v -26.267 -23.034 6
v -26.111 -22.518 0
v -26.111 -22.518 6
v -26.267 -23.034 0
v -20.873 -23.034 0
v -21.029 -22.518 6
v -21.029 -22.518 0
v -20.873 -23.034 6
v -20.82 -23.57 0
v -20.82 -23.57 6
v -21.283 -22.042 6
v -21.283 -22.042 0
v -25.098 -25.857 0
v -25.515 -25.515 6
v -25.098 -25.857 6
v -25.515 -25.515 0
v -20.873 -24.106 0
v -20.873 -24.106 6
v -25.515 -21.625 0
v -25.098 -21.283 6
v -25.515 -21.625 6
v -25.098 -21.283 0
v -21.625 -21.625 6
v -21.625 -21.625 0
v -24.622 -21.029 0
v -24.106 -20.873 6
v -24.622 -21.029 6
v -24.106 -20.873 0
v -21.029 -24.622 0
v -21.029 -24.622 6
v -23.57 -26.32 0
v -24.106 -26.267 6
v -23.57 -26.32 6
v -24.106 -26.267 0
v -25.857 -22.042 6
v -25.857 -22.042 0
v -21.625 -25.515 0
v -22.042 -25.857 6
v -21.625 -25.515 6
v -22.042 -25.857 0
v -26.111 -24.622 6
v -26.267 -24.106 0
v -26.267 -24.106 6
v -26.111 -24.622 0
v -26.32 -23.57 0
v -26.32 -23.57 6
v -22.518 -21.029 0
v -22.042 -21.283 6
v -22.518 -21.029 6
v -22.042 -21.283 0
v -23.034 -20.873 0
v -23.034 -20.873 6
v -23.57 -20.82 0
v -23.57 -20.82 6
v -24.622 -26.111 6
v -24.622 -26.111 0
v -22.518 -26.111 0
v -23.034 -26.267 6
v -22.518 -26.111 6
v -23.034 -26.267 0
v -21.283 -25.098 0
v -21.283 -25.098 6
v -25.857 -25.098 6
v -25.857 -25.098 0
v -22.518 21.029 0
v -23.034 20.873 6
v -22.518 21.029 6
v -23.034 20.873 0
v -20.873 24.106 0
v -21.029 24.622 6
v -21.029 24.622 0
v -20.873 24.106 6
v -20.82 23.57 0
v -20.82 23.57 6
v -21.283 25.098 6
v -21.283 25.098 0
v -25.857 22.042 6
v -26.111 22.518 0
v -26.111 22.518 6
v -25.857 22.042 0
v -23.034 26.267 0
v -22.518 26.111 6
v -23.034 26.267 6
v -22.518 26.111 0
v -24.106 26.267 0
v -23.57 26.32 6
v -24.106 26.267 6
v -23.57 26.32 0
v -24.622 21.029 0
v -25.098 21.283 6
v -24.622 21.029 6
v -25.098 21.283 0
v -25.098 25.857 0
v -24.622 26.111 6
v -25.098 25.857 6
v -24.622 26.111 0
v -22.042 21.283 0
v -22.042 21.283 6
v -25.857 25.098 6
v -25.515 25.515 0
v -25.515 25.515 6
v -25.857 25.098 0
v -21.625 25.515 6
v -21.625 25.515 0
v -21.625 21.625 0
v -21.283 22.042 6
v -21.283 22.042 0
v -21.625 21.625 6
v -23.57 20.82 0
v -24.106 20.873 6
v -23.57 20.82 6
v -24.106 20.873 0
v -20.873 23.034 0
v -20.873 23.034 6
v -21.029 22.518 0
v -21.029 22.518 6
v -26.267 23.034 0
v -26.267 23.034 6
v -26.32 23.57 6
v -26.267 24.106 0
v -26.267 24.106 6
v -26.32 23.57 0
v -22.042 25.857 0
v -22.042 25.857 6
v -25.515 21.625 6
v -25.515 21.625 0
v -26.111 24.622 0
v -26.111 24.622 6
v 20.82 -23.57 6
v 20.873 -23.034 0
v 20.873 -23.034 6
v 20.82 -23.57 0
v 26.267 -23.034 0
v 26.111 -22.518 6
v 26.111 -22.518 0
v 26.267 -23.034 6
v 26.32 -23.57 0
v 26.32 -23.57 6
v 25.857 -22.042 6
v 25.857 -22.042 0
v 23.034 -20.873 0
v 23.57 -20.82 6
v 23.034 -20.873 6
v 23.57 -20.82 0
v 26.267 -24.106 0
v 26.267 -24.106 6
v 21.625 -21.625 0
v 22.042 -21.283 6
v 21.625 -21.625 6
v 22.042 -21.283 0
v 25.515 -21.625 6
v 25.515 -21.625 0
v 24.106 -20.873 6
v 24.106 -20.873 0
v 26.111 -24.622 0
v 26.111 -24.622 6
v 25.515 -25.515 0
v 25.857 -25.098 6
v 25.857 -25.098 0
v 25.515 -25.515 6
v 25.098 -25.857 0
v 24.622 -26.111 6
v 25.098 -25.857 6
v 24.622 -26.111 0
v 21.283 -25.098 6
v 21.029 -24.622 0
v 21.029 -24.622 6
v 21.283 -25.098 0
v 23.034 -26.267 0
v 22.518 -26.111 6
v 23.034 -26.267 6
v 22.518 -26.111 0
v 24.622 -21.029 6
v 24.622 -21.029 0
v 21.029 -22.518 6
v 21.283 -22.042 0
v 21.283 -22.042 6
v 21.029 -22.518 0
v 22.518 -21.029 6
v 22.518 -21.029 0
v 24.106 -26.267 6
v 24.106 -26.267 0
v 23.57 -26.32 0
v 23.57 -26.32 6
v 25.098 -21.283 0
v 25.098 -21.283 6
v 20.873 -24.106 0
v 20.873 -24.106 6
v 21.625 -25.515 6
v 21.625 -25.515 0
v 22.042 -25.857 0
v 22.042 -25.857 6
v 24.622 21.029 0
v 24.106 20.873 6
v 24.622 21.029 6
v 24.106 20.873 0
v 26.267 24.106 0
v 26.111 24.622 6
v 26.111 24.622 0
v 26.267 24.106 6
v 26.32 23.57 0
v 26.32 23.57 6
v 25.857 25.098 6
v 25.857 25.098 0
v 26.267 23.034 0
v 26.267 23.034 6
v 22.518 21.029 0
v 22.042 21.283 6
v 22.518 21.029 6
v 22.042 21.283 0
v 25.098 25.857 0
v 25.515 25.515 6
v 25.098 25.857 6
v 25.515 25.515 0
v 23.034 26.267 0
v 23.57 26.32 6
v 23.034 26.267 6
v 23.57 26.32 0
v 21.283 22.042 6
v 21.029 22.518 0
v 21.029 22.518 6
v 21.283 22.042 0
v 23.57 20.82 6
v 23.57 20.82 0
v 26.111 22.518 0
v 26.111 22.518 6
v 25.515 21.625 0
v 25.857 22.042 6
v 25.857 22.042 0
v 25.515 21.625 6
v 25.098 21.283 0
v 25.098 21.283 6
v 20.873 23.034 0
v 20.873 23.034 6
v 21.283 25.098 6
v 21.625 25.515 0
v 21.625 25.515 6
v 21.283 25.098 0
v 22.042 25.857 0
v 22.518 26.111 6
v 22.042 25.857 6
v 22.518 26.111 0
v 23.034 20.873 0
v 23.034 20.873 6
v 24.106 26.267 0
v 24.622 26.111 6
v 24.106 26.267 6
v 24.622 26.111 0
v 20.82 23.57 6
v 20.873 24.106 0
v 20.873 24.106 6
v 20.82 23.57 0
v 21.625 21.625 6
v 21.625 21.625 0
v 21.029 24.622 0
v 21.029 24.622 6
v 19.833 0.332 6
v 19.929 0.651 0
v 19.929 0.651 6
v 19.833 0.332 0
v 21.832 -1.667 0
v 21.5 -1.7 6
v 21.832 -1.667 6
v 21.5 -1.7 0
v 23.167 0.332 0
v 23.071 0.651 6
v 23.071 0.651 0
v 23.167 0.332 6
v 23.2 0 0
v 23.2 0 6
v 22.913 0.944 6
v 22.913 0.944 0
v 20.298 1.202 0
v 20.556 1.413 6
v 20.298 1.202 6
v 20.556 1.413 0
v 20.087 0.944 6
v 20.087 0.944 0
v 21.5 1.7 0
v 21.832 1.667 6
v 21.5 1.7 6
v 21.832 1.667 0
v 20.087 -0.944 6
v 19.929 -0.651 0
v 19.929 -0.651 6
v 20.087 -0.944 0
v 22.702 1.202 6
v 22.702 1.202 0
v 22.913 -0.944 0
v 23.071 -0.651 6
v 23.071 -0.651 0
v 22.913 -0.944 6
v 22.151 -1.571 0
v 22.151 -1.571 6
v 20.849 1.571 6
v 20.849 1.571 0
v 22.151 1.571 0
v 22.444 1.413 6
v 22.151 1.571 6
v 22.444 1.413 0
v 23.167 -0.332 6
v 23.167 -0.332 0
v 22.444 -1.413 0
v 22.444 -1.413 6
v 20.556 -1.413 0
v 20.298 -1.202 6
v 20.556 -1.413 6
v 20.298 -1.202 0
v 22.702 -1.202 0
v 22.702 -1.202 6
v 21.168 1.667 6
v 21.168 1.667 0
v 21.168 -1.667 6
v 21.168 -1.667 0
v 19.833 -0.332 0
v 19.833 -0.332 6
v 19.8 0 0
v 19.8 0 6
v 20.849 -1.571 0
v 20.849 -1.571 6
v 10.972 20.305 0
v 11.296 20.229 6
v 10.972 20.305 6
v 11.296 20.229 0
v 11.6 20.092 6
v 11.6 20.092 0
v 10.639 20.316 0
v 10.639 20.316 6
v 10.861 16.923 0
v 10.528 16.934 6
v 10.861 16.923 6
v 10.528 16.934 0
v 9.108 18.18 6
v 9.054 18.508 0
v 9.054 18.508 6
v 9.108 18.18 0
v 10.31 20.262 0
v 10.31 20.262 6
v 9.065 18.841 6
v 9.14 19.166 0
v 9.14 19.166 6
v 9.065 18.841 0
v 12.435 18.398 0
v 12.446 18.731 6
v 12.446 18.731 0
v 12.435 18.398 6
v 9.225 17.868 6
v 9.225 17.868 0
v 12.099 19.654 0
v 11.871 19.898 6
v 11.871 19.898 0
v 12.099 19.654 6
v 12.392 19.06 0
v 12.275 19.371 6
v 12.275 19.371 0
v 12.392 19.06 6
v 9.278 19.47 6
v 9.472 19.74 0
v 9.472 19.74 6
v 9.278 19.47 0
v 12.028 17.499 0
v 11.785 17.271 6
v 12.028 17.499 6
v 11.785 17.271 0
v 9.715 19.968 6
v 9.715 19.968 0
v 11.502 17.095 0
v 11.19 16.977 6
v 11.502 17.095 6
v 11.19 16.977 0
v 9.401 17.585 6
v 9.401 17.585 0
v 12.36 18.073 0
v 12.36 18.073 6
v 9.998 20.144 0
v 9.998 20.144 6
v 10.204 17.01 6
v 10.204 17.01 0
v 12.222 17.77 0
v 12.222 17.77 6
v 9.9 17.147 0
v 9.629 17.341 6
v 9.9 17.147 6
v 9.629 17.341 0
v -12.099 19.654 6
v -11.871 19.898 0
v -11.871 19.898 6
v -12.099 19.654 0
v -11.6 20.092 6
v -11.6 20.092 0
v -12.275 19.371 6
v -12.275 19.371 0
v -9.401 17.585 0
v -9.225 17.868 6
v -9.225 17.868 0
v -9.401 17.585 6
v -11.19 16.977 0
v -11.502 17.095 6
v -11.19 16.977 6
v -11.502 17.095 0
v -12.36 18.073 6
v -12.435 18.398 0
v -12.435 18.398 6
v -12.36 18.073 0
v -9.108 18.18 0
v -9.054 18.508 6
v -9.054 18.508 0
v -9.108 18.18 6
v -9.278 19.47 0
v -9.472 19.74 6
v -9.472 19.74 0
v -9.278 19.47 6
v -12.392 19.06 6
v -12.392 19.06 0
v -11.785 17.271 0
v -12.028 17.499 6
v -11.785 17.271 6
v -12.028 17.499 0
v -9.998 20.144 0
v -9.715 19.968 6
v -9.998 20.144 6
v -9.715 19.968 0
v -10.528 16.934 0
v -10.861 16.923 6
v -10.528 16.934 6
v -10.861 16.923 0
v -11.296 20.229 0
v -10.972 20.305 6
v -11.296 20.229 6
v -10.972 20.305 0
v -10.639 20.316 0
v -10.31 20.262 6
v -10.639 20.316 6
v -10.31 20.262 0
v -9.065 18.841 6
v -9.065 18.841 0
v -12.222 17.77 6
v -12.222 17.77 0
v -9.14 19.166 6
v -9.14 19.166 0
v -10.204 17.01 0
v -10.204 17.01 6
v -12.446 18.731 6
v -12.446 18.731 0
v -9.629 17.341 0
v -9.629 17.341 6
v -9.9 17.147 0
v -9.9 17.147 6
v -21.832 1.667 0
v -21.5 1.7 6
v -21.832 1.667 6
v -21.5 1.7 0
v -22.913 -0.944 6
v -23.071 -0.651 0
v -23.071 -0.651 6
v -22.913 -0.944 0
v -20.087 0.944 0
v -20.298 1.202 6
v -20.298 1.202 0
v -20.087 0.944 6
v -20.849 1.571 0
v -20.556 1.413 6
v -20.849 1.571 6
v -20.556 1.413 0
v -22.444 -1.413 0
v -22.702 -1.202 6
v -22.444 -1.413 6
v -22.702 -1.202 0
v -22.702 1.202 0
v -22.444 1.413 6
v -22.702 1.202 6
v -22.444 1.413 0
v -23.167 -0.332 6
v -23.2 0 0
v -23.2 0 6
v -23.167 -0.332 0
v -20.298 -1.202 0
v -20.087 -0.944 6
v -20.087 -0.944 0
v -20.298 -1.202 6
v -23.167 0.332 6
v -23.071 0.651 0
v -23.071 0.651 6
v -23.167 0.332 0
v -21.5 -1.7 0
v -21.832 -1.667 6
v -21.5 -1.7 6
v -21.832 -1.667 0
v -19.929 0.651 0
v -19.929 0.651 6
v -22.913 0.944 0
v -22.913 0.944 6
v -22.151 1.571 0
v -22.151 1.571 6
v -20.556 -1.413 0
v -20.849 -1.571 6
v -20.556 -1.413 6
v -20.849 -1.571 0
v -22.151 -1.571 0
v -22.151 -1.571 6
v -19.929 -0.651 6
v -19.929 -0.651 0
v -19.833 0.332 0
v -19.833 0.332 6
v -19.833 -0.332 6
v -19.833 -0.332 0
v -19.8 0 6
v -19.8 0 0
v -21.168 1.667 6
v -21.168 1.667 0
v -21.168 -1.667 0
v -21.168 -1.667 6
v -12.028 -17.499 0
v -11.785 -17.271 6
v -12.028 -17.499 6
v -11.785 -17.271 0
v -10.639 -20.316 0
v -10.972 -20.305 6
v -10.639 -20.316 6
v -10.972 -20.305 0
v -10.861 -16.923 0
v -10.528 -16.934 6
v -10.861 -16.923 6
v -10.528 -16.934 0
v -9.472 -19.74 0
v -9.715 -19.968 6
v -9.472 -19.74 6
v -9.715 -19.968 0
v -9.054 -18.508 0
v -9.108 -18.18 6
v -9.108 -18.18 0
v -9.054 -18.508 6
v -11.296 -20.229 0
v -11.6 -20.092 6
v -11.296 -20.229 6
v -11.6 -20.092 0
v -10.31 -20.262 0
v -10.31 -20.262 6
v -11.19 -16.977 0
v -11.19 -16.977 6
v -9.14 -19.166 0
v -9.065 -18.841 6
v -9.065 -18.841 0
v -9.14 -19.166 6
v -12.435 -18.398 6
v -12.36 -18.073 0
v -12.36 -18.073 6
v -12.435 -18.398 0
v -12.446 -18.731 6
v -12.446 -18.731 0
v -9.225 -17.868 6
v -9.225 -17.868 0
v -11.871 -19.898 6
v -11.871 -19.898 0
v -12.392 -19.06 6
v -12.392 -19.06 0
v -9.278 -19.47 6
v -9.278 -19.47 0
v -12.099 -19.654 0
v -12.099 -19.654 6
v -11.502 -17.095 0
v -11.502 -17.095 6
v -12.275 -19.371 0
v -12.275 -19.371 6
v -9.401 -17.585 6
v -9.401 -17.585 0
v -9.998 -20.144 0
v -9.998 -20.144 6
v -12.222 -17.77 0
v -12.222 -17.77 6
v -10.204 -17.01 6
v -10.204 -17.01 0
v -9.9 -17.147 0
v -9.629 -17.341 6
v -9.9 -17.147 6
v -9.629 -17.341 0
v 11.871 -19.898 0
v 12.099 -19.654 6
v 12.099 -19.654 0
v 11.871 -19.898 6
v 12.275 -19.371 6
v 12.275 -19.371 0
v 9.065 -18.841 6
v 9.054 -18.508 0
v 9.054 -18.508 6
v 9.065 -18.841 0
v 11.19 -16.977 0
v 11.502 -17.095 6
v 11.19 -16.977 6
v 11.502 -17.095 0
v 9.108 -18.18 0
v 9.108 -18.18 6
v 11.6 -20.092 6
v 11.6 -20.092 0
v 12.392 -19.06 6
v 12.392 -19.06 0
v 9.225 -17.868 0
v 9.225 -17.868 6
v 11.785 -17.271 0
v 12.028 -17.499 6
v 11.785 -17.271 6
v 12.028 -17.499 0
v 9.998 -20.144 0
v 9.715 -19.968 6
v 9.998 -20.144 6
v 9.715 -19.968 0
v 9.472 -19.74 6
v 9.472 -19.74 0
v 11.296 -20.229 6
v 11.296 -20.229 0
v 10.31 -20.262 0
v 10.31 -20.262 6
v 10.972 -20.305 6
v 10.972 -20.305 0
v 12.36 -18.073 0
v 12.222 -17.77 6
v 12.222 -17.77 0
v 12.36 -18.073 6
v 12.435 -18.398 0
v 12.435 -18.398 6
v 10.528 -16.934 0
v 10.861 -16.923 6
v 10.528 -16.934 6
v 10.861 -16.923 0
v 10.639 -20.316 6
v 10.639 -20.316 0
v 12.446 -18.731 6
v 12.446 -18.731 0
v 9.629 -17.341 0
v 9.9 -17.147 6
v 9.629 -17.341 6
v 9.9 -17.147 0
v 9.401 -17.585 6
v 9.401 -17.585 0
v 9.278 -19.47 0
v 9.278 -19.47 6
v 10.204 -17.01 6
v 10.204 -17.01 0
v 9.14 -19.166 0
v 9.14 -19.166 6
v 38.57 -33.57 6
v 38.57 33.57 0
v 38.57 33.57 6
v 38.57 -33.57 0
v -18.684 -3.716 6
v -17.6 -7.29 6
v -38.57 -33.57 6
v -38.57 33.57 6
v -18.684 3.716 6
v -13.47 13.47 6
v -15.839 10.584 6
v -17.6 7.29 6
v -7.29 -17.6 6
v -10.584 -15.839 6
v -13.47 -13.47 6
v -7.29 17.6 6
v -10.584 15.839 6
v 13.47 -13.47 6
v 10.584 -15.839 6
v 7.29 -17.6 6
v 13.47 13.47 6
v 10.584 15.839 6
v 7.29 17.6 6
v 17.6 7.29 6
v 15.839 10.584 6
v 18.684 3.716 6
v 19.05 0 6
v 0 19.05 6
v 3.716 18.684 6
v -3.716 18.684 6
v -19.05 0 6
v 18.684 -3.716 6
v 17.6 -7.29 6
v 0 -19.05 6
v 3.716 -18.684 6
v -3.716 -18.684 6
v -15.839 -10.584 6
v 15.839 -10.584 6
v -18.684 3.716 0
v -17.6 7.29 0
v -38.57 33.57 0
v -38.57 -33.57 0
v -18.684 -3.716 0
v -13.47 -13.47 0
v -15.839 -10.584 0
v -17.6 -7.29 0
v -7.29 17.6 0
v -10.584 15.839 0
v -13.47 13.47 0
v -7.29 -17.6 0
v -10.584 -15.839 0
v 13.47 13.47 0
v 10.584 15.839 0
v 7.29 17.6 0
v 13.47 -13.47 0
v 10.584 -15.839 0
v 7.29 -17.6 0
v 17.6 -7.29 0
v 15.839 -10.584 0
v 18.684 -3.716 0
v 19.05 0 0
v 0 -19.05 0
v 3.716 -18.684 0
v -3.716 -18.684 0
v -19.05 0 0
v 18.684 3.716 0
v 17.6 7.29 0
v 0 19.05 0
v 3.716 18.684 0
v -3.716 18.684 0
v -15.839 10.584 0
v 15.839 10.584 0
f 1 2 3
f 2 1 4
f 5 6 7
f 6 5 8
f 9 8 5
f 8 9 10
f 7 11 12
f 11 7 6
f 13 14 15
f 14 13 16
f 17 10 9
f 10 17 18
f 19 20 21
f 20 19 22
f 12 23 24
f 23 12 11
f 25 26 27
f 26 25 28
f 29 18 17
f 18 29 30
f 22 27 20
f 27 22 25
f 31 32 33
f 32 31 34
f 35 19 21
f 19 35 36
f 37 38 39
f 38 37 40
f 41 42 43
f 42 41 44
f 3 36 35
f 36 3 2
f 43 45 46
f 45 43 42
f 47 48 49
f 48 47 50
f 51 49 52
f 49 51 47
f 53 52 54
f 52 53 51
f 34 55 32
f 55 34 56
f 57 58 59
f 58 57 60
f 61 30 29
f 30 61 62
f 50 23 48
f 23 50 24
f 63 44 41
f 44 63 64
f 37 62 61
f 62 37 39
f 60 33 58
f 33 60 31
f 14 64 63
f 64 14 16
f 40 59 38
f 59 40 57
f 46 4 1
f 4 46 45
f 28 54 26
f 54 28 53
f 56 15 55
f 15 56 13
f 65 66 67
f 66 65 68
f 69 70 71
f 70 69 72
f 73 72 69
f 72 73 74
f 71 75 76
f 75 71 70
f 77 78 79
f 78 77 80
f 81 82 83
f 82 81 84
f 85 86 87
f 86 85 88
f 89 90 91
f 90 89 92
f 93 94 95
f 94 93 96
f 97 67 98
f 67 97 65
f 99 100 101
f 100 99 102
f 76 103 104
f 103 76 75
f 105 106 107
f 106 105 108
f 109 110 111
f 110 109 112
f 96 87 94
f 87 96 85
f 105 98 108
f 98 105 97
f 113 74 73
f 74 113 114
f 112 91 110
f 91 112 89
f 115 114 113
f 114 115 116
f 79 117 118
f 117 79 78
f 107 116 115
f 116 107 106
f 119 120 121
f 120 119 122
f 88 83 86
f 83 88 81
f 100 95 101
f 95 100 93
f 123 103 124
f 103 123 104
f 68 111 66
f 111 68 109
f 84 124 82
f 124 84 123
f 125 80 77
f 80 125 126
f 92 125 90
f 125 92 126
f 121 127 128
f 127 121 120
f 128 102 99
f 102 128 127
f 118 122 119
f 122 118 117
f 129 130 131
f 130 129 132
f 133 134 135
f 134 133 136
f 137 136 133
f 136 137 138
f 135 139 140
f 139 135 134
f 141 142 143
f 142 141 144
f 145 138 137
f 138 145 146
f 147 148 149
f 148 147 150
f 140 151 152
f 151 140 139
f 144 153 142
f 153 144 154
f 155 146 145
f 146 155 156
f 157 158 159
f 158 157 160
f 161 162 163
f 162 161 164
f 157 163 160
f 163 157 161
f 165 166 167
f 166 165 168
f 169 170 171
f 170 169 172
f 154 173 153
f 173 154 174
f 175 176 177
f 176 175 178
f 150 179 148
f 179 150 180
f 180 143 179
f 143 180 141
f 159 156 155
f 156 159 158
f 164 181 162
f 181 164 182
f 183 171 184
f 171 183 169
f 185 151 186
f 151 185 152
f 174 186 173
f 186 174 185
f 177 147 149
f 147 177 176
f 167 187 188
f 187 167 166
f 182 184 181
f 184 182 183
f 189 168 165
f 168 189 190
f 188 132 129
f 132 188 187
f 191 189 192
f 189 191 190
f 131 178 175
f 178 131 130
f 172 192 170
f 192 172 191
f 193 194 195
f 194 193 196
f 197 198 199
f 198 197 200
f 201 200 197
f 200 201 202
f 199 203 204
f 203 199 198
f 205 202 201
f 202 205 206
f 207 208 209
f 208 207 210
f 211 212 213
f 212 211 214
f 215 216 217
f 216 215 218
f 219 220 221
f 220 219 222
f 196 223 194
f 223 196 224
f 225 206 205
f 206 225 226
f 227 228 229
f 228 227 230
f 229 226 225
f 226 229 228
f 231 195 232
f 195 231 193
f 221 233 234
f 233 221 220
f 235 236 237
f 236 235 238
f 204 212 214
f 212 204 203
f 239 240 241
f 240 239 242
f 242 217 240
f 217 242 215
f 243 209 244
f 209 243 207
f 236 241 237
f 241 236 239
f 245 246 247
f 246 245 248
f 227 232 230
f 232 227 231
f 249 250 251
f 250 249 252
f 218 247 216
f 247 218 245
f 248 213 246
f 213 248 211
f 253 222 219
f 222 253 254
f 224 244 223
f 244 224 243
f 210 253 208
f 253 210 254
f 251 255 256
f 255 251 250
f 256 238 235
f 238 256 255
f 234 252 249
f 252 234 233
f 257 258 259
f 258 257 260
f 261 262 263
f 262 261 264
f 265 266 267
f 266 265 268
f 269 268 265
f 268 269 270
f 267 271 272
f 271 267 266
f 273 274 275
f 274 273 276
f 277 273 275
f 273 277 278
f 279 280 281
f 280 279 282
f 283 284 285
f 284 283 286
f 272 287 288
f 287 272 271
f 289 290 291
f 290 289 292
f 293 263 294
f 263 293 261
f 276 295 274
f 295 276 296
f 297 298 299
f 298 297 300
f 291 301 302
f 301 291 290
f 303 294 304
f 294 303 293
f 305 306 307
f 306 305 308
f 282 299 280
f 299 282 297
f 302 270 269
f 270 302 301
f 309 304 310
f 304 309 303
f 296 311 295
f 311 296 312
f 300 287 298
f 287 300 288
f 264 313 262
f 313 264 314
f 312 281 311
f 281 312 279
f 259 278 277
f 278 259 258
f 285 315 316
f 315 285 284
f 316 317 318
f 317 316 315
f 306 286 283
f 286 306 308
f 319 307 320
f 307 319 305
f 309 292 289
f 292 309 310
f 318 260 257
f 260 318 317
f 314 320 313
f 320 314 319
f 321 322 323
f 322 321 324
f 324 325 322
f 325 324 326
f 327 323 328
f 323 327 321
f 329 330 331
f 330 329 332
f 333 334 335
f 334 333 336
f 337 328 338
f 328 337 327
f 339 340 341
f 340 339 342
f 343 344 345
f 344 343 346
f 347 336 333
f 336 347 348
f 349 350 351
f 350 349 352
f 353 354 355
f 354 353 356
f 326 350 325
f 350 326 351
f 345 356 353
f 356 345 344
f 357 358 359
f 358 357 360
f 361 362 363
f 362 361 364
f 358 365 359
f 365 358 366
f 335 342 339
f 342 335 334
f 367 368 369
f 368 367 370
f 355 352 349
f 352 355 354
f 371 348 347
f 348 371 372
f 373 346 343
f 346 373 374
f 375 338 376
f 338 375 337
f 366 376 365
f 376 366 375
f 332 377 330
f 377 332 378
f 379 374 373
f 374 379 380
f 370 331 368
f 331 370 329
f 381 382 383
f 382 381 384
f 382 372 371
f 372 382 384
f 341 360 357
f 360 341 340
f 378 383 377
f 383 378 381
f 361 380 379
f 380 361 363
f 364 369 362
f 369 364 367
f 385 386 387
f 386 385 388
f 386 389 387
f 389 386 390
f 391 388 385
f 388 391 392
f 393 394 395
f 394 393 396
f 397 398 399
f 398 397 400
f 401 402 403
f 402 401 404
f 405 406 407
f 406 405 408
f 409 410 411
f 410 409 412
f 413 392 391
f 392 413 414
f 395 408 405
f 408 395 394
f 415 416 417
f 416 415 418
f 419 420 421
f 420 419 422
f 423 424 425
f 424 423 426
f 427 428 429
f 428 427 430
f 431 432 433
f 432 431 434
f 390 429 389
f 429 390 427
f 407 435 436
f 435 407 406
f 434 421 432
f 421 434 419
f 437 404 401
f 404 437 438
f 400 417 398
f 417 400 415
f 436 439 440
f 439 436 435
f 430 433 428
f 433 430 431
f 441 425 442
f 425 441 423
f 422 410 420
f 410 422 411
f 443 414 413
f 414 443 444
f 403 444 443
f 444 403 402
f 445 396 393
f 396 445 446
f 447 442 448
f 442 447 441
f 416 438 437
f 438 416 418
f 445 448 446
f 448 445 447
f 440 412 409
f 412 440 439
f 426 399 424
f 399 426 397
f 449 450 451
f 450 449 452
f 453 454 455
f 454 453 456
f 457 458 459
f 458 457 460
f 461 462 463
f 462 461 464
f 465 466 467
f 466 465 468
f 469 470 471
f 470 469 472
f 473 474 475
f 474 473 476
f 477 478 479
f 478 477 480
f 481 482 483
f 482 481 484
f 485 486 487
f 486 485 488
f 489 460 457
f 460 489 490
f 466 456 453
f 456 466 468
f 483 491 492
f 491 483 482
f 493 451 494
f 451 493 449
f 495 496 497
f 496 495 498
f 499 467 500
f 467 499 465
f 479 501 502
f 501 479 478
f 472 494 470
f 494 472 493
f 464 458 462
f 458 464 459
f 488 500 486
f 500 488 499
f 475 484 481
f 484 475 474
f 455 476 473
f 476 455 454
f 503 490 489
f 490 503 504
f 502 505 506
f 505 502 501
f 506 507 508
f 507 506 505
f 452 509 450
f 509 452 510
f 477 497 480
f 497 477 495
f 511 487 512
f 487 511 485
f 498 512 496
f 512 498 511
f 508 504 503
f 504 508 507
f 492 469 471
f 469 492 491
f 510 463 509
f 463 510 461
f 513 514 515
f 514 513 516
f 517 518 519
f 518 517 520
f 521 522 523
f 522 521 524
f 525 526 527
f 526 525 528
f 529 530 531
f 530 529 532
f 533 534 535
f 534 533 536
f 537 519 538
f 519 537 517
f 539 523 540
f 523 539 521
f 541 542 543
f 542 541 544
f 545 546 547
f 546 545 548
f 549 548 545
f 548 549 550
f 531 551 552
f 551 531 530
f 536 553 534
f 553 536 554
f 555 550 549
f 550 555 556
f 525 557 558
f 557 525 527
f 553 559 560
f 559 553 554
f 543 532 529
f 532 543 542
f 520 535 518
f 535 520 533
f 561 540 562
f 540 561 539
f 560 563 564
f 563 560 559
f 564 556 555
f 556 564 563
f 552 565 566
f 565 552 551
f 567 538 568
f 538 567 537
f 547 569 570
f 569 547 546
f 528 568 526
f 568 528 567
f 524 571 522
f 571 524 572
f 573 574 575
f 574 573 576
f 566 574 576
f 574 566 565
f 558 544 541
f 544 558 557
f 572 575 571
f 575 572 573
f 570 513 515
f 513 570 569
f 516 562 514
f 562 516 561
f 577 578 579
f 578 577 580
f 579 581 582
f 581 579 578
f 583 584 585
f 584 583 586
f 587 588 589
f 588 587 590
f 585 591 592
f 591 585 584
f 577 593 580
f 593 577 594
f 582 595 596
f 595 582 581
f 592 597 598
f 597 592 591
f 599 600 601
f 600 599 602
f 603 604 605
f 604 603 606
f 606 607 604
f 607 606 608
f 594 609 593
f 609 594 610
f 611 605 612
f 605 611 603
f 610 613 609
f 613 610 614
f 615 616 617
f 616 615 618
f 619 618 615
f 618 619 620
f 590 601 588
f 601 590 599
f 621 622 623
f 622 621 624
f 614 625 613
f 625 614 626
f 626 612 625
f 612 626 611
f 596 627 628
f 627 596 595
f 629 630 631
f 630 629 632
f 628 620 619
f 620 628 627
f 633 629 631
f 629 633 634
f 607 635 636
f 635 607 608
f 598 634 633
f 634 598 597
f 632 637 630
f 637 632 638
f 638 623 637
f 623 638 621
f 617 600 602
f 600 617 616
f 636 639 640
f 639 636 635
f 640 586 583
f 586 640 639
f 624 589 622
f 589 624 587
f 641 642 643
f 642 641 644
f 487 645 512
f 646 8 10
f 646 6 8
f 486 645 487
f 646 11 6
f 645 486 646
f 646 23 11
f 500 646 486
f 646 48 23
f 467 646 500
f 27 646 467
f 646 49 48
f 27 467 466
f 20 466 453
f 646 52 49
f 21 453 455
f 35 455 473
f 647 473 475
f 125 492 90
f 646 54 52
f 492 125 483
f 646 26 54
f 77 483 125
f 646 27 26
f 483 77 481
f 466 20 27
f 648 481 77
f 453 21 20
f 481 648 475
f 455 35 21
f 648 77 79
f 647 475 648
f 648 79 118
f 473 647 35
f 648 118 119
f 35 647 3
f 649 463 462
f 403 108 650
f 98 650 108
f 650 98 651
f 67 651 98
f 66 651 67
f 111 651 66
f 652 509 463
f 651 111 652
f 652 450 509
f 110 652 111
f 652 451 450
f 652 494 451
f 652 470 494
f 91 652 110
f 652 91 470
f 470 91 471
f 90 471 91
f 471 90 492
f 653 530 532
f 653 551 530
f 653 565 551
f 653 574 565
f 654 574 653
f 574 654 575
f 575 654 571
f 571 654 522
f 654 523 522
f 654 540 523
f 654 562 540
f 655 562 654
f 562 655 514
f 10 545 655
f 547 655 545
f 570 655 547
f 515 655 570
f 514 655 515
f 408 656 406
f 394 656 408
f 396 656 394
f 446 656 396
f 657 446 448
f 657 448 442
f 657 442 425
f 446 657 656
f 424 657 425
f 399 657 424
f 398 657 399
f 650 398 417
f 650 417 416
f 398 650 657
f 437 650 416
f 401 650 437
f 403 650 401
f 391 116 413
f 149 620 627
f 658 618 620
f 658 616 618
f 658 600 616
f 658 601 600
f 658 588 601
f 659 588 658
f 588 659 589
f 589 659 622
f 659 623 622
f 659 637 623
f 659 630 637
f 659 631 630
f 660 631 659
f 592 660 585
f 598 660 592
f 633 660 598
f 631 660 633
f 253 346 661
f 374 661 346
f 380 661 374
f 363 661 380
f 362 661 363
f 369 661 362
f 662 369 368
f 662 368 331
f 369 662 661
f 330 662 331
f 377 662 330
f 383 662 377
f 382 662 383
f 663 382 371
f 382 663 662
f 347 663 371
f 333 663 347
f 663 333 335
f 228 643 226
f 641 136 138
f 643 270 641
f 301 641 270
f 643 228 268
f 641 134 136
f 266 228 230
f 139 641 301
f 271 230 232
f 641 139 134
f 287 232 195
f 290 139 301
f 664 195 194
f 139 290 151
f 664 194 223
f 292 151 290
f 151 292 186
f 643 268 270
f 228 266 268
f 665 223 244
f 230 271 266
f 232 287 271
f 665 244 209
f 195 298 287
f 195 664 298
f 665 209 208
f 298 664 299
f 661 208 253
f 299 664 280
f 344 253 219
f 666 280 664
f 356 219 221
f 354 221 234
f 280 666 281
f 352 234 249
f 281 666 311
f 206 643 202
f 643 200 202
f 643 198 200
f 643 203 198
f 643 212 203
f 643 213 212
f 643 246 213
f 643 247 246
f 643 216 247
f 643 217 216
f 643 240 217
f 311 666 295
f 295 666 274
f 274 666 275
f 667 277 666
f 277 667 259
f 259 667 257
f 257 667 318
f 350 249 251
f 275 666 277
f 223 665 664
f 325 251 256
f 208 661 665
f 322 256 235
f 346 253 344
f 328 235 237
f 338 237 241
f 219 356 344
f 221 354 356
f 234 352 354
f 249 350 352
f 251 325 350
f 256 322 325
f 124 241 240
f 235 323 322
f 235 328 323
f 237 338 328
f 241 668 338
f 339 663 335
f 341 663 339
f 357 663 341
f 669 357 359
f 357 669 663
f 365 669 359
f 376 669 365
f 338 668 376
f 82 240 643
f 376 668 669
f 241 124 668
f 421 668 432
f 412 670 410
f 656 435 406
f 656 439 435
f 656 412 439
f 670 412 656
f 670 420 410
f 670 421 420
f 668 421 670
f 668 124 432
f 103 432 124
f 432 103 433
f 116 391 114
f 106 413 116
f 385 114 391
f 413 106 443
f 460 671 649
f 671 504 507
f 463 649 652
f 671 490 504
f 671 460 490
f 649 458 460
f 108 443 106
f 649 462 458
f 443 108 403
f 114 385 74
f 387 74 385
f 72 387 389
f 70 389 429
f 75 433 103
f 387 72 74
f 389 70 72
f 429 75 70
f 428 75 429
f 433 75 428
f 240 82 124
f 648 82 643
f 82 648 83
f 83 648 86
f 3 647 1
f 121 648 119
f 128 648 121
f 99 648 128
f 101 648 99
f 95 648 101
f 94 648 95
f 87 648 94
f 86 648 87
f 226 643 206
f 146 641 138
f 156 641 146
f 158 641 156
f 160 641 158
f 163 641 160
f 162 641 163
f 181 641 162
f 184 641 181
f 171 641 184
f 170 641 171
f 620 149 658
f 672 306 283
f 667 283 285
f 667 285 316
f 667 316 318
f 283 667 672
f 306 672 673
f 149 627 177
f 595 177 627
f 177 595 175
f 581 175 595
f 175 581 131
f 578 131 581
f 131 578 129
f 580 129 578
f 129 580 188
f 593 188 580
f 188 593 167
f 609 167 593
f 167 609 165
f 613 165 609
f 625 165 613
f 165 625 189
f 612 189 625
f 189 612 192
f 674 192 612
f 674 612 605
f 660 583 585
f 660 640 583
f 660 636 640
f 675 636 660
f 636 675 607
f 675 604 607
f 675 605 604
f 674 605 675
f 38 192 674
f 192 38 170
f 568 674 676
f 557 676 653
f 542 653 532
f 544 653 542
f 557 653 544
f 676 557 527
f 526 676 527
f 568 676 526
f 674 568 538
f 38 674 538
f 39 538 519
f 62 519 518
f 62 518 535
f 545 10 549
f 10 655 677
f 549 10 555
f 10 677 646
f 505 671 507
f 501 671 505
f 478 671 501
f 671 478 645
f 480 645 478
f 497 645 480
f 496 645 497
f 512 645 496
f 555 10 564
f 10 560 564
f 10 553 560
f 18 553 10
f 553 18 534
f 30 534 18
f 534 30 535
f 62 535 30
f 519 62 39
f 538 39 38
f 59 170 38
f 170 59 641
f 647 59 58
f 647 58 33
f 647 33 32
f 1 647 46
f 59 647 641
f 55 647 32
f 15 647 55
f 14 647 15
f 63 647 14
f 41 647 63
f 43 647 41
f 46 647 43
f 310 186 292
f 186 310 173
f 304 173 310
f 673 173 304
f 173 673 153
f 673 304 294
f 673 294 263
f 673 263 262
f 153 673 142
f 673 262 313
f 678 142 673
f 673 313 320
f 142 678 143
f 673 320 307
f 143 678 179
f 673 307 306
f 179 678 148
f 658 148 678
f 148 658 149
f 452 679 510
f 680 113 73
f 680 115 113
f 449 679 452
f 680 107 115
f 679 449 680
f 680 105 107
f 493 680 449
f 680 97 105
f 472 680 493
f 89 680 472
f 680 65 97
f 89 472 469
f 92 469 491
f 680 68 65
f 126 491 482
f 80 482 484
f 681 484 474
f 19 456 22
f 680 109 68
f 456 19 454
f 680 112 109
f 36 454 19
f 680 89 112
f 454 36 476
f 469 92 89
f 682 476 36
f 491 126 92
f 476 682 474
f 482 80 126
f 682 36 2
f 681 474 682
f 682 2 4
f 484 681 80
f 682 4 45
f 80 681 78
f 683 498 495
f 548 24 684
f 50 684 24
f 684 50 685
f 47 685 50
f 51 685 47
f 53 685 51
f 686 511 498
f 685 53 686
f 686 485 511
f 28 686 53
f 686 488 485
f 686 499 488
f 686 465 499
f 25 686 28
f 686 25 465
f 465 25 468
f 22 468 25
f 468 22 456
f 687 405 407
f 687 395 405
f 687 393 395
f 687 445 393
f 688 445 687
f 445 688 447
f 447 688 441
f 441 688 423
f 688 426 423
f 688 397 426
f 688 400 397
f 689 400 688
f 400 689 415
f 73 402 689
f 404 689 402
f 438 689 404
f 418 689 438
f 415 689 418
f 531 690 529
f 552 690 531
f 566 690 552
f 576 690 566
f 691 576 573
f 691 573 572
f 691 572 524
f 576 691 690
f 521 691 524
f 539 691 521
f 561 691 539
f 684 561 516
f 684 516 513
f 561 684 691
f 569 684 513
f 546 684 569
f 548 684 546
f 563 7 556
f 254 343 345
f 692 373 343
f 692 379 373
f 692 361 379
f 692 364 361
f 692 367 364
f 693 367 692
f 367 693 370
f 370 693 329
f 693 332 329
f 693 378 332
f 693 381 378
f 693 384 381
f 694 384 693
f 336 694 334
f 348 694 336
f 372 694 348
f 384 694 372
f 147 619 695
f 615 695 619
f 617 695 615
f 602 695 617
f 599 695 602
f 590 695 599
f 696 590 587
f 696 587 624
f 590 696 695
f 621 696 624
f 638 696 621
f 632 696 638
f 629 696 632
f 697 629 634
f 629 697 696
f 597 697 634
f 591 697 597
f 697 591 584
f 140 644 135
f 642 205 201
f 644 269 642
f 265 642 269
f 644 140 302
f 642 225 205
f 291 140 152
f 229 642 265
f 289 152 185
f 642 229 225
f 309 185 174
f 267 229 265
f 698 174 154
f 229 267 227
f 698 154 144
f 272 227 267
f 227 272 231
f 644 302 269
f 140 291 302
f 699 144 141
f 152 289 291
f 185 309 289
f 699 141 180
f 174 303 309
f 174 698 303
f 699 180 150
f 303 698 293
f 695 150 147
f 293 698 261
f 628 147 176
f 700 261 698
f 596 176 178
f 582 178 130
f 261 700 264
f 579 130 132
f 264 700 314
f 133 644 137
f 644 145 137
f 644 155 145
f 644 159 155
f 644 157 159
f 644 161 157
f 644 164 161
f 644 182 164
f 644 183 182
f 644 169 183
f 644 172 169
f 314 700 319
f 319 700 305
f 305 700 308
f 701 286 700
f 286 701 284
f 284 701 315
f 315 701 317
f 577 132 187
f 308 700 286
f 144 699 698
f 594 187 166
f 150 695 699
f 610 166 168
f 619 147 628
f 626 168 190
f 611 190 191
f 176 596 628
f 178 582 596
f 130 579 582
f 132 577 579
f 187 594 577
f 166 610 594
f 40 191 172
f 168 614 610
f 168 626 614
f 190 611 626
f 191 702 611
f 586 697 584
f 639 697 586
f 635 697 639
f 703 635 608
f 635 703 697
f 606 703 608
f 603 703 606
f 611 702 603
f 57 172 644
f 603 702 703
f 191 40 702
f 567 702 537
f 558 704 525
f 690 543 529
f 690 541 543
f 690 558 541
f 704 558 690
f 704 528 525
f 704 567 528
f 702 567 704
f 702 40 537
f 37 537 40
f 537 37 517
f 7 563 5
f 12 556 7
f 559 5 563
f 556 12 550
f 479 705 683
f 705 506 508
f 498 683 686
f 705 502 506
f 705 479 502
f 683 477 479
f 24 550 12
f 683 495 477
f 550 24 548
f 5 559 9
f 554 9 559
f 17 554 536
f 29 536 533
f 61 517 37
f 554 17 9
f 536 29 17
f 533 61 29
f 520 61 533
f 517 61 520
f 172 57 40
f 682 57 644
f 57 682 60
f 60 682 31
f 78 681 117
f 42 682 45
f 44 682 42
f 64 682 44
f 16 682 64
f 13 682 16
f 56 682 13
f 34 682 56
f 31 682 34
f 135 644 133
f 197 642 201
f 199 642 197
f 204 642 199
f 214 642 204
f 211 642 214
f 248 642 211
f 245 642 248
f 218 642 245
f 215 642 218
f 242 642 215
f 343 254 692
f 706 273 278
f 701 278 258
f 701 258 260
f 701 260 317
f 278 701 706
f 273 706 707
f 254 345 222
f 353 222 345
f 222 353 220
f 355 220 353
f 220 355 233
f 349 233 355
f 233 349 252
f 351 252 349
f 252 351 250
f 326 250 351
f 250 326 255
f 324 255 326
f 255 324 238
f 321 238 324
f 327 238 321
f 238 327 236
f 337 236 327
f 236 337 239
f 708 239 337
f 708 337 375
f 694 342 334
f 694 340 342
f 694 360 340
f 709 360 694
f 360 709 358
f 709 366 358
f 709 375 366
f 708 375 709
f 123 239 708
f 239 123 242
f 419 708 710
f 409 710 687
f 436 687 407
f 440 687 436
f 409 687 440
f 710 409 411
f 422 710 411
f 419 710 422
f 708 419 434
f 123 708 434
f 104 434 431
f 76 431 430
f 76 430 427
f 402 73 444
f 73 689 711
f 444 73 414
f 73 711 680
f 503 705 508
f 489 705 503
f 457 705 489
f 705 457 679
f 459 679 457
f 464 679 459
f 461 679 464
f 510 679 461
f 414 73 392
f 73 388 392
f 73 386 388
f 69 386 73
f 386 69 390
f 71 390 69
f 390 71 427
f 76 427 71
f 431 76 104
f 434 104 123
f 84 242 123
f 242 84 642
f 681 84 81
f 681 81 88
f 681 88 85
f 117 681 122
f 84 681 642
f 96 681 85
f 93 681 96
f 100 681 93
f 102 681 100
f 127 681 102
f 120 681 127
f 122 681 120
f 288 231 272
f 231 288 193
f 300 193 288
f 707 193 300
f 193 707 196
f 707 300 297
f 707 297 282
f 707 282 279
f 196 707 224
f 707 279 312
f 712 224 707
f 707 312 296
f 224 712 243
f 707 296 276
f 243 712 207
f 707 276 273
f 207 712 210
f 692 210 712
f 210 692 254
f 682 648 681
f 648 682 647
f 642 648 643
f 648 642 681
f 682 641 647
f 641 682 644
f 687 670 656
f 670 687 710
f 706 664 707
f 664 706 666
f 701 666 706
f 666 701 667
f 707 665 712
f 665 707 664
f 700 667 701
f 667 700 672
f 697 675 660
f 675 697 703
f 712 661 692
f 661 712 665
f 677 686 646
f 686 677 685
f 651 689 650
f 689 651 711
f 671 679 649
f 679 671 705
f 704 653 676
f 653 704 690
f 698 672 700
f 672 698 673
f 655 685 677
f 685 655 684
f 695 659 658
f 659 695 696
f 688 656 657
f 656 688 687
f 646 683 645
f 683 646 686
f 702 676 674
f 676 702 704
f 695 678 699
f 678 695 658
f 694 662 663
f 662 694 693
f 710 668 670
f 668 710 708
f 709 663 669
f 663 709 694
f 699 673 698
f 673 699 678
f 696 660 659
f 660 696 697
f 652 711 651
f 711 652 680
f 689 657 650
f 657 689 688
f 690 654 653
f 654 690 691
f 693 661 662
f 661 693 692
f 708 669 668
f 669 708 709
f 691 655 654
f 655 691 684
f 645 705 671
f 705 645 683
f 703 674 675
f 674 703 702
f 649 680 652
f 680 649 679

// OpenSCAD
$fn = 32;

// ----------------------------------------------------------------------
// Motor mount plate: NEMA23, 77.14 x 67.14 x 6 mm
// ----------------------------------------------------------------------

// --- parameters (mm) ---
mount_w = 77.14;          // plate length, X
mount_d = 67.14;          // plate width, Y
mat_t = 6;                // plate thickness
motor_pitch = 47.14;      // NEMA23 bolt spacing
motor_d = 5.5;            // NEMA23 screw clearance
center_bore = 38.1;       // pilot boss bore
second_d = 3.4;           // second fastener hole
bc_r = 21.5;              // second bolt circle radius
bc_n = 6;                 // second bolt circle count

module plate() {
  translate([-mount_w / 2, -mount_d / 2, 0]) cube([mount_w, mount_d, mat_t]);
}

module motor_holes() {
  for (sx = [-1, 1]) for (sy = [-1, 1])
    translate([sx * motor_pitch / 2, sy * motor_pitch / 2, -1])
      cylinder(h = mat_t + 2, d = motor_d);
}

difference() {
  union() {
    plate();
  }
  motor_holes();
  translate([0, 0, -1]) cylinder(h = mat_t + 2, d = center_bore);
  for (i = [0 : bc_n - 1]) rotate([0, 0, i * 360 / bc_n]) translate([bc_r, 0, -1])    cylinder(h = mat_t + 2, d = second_d);
}
